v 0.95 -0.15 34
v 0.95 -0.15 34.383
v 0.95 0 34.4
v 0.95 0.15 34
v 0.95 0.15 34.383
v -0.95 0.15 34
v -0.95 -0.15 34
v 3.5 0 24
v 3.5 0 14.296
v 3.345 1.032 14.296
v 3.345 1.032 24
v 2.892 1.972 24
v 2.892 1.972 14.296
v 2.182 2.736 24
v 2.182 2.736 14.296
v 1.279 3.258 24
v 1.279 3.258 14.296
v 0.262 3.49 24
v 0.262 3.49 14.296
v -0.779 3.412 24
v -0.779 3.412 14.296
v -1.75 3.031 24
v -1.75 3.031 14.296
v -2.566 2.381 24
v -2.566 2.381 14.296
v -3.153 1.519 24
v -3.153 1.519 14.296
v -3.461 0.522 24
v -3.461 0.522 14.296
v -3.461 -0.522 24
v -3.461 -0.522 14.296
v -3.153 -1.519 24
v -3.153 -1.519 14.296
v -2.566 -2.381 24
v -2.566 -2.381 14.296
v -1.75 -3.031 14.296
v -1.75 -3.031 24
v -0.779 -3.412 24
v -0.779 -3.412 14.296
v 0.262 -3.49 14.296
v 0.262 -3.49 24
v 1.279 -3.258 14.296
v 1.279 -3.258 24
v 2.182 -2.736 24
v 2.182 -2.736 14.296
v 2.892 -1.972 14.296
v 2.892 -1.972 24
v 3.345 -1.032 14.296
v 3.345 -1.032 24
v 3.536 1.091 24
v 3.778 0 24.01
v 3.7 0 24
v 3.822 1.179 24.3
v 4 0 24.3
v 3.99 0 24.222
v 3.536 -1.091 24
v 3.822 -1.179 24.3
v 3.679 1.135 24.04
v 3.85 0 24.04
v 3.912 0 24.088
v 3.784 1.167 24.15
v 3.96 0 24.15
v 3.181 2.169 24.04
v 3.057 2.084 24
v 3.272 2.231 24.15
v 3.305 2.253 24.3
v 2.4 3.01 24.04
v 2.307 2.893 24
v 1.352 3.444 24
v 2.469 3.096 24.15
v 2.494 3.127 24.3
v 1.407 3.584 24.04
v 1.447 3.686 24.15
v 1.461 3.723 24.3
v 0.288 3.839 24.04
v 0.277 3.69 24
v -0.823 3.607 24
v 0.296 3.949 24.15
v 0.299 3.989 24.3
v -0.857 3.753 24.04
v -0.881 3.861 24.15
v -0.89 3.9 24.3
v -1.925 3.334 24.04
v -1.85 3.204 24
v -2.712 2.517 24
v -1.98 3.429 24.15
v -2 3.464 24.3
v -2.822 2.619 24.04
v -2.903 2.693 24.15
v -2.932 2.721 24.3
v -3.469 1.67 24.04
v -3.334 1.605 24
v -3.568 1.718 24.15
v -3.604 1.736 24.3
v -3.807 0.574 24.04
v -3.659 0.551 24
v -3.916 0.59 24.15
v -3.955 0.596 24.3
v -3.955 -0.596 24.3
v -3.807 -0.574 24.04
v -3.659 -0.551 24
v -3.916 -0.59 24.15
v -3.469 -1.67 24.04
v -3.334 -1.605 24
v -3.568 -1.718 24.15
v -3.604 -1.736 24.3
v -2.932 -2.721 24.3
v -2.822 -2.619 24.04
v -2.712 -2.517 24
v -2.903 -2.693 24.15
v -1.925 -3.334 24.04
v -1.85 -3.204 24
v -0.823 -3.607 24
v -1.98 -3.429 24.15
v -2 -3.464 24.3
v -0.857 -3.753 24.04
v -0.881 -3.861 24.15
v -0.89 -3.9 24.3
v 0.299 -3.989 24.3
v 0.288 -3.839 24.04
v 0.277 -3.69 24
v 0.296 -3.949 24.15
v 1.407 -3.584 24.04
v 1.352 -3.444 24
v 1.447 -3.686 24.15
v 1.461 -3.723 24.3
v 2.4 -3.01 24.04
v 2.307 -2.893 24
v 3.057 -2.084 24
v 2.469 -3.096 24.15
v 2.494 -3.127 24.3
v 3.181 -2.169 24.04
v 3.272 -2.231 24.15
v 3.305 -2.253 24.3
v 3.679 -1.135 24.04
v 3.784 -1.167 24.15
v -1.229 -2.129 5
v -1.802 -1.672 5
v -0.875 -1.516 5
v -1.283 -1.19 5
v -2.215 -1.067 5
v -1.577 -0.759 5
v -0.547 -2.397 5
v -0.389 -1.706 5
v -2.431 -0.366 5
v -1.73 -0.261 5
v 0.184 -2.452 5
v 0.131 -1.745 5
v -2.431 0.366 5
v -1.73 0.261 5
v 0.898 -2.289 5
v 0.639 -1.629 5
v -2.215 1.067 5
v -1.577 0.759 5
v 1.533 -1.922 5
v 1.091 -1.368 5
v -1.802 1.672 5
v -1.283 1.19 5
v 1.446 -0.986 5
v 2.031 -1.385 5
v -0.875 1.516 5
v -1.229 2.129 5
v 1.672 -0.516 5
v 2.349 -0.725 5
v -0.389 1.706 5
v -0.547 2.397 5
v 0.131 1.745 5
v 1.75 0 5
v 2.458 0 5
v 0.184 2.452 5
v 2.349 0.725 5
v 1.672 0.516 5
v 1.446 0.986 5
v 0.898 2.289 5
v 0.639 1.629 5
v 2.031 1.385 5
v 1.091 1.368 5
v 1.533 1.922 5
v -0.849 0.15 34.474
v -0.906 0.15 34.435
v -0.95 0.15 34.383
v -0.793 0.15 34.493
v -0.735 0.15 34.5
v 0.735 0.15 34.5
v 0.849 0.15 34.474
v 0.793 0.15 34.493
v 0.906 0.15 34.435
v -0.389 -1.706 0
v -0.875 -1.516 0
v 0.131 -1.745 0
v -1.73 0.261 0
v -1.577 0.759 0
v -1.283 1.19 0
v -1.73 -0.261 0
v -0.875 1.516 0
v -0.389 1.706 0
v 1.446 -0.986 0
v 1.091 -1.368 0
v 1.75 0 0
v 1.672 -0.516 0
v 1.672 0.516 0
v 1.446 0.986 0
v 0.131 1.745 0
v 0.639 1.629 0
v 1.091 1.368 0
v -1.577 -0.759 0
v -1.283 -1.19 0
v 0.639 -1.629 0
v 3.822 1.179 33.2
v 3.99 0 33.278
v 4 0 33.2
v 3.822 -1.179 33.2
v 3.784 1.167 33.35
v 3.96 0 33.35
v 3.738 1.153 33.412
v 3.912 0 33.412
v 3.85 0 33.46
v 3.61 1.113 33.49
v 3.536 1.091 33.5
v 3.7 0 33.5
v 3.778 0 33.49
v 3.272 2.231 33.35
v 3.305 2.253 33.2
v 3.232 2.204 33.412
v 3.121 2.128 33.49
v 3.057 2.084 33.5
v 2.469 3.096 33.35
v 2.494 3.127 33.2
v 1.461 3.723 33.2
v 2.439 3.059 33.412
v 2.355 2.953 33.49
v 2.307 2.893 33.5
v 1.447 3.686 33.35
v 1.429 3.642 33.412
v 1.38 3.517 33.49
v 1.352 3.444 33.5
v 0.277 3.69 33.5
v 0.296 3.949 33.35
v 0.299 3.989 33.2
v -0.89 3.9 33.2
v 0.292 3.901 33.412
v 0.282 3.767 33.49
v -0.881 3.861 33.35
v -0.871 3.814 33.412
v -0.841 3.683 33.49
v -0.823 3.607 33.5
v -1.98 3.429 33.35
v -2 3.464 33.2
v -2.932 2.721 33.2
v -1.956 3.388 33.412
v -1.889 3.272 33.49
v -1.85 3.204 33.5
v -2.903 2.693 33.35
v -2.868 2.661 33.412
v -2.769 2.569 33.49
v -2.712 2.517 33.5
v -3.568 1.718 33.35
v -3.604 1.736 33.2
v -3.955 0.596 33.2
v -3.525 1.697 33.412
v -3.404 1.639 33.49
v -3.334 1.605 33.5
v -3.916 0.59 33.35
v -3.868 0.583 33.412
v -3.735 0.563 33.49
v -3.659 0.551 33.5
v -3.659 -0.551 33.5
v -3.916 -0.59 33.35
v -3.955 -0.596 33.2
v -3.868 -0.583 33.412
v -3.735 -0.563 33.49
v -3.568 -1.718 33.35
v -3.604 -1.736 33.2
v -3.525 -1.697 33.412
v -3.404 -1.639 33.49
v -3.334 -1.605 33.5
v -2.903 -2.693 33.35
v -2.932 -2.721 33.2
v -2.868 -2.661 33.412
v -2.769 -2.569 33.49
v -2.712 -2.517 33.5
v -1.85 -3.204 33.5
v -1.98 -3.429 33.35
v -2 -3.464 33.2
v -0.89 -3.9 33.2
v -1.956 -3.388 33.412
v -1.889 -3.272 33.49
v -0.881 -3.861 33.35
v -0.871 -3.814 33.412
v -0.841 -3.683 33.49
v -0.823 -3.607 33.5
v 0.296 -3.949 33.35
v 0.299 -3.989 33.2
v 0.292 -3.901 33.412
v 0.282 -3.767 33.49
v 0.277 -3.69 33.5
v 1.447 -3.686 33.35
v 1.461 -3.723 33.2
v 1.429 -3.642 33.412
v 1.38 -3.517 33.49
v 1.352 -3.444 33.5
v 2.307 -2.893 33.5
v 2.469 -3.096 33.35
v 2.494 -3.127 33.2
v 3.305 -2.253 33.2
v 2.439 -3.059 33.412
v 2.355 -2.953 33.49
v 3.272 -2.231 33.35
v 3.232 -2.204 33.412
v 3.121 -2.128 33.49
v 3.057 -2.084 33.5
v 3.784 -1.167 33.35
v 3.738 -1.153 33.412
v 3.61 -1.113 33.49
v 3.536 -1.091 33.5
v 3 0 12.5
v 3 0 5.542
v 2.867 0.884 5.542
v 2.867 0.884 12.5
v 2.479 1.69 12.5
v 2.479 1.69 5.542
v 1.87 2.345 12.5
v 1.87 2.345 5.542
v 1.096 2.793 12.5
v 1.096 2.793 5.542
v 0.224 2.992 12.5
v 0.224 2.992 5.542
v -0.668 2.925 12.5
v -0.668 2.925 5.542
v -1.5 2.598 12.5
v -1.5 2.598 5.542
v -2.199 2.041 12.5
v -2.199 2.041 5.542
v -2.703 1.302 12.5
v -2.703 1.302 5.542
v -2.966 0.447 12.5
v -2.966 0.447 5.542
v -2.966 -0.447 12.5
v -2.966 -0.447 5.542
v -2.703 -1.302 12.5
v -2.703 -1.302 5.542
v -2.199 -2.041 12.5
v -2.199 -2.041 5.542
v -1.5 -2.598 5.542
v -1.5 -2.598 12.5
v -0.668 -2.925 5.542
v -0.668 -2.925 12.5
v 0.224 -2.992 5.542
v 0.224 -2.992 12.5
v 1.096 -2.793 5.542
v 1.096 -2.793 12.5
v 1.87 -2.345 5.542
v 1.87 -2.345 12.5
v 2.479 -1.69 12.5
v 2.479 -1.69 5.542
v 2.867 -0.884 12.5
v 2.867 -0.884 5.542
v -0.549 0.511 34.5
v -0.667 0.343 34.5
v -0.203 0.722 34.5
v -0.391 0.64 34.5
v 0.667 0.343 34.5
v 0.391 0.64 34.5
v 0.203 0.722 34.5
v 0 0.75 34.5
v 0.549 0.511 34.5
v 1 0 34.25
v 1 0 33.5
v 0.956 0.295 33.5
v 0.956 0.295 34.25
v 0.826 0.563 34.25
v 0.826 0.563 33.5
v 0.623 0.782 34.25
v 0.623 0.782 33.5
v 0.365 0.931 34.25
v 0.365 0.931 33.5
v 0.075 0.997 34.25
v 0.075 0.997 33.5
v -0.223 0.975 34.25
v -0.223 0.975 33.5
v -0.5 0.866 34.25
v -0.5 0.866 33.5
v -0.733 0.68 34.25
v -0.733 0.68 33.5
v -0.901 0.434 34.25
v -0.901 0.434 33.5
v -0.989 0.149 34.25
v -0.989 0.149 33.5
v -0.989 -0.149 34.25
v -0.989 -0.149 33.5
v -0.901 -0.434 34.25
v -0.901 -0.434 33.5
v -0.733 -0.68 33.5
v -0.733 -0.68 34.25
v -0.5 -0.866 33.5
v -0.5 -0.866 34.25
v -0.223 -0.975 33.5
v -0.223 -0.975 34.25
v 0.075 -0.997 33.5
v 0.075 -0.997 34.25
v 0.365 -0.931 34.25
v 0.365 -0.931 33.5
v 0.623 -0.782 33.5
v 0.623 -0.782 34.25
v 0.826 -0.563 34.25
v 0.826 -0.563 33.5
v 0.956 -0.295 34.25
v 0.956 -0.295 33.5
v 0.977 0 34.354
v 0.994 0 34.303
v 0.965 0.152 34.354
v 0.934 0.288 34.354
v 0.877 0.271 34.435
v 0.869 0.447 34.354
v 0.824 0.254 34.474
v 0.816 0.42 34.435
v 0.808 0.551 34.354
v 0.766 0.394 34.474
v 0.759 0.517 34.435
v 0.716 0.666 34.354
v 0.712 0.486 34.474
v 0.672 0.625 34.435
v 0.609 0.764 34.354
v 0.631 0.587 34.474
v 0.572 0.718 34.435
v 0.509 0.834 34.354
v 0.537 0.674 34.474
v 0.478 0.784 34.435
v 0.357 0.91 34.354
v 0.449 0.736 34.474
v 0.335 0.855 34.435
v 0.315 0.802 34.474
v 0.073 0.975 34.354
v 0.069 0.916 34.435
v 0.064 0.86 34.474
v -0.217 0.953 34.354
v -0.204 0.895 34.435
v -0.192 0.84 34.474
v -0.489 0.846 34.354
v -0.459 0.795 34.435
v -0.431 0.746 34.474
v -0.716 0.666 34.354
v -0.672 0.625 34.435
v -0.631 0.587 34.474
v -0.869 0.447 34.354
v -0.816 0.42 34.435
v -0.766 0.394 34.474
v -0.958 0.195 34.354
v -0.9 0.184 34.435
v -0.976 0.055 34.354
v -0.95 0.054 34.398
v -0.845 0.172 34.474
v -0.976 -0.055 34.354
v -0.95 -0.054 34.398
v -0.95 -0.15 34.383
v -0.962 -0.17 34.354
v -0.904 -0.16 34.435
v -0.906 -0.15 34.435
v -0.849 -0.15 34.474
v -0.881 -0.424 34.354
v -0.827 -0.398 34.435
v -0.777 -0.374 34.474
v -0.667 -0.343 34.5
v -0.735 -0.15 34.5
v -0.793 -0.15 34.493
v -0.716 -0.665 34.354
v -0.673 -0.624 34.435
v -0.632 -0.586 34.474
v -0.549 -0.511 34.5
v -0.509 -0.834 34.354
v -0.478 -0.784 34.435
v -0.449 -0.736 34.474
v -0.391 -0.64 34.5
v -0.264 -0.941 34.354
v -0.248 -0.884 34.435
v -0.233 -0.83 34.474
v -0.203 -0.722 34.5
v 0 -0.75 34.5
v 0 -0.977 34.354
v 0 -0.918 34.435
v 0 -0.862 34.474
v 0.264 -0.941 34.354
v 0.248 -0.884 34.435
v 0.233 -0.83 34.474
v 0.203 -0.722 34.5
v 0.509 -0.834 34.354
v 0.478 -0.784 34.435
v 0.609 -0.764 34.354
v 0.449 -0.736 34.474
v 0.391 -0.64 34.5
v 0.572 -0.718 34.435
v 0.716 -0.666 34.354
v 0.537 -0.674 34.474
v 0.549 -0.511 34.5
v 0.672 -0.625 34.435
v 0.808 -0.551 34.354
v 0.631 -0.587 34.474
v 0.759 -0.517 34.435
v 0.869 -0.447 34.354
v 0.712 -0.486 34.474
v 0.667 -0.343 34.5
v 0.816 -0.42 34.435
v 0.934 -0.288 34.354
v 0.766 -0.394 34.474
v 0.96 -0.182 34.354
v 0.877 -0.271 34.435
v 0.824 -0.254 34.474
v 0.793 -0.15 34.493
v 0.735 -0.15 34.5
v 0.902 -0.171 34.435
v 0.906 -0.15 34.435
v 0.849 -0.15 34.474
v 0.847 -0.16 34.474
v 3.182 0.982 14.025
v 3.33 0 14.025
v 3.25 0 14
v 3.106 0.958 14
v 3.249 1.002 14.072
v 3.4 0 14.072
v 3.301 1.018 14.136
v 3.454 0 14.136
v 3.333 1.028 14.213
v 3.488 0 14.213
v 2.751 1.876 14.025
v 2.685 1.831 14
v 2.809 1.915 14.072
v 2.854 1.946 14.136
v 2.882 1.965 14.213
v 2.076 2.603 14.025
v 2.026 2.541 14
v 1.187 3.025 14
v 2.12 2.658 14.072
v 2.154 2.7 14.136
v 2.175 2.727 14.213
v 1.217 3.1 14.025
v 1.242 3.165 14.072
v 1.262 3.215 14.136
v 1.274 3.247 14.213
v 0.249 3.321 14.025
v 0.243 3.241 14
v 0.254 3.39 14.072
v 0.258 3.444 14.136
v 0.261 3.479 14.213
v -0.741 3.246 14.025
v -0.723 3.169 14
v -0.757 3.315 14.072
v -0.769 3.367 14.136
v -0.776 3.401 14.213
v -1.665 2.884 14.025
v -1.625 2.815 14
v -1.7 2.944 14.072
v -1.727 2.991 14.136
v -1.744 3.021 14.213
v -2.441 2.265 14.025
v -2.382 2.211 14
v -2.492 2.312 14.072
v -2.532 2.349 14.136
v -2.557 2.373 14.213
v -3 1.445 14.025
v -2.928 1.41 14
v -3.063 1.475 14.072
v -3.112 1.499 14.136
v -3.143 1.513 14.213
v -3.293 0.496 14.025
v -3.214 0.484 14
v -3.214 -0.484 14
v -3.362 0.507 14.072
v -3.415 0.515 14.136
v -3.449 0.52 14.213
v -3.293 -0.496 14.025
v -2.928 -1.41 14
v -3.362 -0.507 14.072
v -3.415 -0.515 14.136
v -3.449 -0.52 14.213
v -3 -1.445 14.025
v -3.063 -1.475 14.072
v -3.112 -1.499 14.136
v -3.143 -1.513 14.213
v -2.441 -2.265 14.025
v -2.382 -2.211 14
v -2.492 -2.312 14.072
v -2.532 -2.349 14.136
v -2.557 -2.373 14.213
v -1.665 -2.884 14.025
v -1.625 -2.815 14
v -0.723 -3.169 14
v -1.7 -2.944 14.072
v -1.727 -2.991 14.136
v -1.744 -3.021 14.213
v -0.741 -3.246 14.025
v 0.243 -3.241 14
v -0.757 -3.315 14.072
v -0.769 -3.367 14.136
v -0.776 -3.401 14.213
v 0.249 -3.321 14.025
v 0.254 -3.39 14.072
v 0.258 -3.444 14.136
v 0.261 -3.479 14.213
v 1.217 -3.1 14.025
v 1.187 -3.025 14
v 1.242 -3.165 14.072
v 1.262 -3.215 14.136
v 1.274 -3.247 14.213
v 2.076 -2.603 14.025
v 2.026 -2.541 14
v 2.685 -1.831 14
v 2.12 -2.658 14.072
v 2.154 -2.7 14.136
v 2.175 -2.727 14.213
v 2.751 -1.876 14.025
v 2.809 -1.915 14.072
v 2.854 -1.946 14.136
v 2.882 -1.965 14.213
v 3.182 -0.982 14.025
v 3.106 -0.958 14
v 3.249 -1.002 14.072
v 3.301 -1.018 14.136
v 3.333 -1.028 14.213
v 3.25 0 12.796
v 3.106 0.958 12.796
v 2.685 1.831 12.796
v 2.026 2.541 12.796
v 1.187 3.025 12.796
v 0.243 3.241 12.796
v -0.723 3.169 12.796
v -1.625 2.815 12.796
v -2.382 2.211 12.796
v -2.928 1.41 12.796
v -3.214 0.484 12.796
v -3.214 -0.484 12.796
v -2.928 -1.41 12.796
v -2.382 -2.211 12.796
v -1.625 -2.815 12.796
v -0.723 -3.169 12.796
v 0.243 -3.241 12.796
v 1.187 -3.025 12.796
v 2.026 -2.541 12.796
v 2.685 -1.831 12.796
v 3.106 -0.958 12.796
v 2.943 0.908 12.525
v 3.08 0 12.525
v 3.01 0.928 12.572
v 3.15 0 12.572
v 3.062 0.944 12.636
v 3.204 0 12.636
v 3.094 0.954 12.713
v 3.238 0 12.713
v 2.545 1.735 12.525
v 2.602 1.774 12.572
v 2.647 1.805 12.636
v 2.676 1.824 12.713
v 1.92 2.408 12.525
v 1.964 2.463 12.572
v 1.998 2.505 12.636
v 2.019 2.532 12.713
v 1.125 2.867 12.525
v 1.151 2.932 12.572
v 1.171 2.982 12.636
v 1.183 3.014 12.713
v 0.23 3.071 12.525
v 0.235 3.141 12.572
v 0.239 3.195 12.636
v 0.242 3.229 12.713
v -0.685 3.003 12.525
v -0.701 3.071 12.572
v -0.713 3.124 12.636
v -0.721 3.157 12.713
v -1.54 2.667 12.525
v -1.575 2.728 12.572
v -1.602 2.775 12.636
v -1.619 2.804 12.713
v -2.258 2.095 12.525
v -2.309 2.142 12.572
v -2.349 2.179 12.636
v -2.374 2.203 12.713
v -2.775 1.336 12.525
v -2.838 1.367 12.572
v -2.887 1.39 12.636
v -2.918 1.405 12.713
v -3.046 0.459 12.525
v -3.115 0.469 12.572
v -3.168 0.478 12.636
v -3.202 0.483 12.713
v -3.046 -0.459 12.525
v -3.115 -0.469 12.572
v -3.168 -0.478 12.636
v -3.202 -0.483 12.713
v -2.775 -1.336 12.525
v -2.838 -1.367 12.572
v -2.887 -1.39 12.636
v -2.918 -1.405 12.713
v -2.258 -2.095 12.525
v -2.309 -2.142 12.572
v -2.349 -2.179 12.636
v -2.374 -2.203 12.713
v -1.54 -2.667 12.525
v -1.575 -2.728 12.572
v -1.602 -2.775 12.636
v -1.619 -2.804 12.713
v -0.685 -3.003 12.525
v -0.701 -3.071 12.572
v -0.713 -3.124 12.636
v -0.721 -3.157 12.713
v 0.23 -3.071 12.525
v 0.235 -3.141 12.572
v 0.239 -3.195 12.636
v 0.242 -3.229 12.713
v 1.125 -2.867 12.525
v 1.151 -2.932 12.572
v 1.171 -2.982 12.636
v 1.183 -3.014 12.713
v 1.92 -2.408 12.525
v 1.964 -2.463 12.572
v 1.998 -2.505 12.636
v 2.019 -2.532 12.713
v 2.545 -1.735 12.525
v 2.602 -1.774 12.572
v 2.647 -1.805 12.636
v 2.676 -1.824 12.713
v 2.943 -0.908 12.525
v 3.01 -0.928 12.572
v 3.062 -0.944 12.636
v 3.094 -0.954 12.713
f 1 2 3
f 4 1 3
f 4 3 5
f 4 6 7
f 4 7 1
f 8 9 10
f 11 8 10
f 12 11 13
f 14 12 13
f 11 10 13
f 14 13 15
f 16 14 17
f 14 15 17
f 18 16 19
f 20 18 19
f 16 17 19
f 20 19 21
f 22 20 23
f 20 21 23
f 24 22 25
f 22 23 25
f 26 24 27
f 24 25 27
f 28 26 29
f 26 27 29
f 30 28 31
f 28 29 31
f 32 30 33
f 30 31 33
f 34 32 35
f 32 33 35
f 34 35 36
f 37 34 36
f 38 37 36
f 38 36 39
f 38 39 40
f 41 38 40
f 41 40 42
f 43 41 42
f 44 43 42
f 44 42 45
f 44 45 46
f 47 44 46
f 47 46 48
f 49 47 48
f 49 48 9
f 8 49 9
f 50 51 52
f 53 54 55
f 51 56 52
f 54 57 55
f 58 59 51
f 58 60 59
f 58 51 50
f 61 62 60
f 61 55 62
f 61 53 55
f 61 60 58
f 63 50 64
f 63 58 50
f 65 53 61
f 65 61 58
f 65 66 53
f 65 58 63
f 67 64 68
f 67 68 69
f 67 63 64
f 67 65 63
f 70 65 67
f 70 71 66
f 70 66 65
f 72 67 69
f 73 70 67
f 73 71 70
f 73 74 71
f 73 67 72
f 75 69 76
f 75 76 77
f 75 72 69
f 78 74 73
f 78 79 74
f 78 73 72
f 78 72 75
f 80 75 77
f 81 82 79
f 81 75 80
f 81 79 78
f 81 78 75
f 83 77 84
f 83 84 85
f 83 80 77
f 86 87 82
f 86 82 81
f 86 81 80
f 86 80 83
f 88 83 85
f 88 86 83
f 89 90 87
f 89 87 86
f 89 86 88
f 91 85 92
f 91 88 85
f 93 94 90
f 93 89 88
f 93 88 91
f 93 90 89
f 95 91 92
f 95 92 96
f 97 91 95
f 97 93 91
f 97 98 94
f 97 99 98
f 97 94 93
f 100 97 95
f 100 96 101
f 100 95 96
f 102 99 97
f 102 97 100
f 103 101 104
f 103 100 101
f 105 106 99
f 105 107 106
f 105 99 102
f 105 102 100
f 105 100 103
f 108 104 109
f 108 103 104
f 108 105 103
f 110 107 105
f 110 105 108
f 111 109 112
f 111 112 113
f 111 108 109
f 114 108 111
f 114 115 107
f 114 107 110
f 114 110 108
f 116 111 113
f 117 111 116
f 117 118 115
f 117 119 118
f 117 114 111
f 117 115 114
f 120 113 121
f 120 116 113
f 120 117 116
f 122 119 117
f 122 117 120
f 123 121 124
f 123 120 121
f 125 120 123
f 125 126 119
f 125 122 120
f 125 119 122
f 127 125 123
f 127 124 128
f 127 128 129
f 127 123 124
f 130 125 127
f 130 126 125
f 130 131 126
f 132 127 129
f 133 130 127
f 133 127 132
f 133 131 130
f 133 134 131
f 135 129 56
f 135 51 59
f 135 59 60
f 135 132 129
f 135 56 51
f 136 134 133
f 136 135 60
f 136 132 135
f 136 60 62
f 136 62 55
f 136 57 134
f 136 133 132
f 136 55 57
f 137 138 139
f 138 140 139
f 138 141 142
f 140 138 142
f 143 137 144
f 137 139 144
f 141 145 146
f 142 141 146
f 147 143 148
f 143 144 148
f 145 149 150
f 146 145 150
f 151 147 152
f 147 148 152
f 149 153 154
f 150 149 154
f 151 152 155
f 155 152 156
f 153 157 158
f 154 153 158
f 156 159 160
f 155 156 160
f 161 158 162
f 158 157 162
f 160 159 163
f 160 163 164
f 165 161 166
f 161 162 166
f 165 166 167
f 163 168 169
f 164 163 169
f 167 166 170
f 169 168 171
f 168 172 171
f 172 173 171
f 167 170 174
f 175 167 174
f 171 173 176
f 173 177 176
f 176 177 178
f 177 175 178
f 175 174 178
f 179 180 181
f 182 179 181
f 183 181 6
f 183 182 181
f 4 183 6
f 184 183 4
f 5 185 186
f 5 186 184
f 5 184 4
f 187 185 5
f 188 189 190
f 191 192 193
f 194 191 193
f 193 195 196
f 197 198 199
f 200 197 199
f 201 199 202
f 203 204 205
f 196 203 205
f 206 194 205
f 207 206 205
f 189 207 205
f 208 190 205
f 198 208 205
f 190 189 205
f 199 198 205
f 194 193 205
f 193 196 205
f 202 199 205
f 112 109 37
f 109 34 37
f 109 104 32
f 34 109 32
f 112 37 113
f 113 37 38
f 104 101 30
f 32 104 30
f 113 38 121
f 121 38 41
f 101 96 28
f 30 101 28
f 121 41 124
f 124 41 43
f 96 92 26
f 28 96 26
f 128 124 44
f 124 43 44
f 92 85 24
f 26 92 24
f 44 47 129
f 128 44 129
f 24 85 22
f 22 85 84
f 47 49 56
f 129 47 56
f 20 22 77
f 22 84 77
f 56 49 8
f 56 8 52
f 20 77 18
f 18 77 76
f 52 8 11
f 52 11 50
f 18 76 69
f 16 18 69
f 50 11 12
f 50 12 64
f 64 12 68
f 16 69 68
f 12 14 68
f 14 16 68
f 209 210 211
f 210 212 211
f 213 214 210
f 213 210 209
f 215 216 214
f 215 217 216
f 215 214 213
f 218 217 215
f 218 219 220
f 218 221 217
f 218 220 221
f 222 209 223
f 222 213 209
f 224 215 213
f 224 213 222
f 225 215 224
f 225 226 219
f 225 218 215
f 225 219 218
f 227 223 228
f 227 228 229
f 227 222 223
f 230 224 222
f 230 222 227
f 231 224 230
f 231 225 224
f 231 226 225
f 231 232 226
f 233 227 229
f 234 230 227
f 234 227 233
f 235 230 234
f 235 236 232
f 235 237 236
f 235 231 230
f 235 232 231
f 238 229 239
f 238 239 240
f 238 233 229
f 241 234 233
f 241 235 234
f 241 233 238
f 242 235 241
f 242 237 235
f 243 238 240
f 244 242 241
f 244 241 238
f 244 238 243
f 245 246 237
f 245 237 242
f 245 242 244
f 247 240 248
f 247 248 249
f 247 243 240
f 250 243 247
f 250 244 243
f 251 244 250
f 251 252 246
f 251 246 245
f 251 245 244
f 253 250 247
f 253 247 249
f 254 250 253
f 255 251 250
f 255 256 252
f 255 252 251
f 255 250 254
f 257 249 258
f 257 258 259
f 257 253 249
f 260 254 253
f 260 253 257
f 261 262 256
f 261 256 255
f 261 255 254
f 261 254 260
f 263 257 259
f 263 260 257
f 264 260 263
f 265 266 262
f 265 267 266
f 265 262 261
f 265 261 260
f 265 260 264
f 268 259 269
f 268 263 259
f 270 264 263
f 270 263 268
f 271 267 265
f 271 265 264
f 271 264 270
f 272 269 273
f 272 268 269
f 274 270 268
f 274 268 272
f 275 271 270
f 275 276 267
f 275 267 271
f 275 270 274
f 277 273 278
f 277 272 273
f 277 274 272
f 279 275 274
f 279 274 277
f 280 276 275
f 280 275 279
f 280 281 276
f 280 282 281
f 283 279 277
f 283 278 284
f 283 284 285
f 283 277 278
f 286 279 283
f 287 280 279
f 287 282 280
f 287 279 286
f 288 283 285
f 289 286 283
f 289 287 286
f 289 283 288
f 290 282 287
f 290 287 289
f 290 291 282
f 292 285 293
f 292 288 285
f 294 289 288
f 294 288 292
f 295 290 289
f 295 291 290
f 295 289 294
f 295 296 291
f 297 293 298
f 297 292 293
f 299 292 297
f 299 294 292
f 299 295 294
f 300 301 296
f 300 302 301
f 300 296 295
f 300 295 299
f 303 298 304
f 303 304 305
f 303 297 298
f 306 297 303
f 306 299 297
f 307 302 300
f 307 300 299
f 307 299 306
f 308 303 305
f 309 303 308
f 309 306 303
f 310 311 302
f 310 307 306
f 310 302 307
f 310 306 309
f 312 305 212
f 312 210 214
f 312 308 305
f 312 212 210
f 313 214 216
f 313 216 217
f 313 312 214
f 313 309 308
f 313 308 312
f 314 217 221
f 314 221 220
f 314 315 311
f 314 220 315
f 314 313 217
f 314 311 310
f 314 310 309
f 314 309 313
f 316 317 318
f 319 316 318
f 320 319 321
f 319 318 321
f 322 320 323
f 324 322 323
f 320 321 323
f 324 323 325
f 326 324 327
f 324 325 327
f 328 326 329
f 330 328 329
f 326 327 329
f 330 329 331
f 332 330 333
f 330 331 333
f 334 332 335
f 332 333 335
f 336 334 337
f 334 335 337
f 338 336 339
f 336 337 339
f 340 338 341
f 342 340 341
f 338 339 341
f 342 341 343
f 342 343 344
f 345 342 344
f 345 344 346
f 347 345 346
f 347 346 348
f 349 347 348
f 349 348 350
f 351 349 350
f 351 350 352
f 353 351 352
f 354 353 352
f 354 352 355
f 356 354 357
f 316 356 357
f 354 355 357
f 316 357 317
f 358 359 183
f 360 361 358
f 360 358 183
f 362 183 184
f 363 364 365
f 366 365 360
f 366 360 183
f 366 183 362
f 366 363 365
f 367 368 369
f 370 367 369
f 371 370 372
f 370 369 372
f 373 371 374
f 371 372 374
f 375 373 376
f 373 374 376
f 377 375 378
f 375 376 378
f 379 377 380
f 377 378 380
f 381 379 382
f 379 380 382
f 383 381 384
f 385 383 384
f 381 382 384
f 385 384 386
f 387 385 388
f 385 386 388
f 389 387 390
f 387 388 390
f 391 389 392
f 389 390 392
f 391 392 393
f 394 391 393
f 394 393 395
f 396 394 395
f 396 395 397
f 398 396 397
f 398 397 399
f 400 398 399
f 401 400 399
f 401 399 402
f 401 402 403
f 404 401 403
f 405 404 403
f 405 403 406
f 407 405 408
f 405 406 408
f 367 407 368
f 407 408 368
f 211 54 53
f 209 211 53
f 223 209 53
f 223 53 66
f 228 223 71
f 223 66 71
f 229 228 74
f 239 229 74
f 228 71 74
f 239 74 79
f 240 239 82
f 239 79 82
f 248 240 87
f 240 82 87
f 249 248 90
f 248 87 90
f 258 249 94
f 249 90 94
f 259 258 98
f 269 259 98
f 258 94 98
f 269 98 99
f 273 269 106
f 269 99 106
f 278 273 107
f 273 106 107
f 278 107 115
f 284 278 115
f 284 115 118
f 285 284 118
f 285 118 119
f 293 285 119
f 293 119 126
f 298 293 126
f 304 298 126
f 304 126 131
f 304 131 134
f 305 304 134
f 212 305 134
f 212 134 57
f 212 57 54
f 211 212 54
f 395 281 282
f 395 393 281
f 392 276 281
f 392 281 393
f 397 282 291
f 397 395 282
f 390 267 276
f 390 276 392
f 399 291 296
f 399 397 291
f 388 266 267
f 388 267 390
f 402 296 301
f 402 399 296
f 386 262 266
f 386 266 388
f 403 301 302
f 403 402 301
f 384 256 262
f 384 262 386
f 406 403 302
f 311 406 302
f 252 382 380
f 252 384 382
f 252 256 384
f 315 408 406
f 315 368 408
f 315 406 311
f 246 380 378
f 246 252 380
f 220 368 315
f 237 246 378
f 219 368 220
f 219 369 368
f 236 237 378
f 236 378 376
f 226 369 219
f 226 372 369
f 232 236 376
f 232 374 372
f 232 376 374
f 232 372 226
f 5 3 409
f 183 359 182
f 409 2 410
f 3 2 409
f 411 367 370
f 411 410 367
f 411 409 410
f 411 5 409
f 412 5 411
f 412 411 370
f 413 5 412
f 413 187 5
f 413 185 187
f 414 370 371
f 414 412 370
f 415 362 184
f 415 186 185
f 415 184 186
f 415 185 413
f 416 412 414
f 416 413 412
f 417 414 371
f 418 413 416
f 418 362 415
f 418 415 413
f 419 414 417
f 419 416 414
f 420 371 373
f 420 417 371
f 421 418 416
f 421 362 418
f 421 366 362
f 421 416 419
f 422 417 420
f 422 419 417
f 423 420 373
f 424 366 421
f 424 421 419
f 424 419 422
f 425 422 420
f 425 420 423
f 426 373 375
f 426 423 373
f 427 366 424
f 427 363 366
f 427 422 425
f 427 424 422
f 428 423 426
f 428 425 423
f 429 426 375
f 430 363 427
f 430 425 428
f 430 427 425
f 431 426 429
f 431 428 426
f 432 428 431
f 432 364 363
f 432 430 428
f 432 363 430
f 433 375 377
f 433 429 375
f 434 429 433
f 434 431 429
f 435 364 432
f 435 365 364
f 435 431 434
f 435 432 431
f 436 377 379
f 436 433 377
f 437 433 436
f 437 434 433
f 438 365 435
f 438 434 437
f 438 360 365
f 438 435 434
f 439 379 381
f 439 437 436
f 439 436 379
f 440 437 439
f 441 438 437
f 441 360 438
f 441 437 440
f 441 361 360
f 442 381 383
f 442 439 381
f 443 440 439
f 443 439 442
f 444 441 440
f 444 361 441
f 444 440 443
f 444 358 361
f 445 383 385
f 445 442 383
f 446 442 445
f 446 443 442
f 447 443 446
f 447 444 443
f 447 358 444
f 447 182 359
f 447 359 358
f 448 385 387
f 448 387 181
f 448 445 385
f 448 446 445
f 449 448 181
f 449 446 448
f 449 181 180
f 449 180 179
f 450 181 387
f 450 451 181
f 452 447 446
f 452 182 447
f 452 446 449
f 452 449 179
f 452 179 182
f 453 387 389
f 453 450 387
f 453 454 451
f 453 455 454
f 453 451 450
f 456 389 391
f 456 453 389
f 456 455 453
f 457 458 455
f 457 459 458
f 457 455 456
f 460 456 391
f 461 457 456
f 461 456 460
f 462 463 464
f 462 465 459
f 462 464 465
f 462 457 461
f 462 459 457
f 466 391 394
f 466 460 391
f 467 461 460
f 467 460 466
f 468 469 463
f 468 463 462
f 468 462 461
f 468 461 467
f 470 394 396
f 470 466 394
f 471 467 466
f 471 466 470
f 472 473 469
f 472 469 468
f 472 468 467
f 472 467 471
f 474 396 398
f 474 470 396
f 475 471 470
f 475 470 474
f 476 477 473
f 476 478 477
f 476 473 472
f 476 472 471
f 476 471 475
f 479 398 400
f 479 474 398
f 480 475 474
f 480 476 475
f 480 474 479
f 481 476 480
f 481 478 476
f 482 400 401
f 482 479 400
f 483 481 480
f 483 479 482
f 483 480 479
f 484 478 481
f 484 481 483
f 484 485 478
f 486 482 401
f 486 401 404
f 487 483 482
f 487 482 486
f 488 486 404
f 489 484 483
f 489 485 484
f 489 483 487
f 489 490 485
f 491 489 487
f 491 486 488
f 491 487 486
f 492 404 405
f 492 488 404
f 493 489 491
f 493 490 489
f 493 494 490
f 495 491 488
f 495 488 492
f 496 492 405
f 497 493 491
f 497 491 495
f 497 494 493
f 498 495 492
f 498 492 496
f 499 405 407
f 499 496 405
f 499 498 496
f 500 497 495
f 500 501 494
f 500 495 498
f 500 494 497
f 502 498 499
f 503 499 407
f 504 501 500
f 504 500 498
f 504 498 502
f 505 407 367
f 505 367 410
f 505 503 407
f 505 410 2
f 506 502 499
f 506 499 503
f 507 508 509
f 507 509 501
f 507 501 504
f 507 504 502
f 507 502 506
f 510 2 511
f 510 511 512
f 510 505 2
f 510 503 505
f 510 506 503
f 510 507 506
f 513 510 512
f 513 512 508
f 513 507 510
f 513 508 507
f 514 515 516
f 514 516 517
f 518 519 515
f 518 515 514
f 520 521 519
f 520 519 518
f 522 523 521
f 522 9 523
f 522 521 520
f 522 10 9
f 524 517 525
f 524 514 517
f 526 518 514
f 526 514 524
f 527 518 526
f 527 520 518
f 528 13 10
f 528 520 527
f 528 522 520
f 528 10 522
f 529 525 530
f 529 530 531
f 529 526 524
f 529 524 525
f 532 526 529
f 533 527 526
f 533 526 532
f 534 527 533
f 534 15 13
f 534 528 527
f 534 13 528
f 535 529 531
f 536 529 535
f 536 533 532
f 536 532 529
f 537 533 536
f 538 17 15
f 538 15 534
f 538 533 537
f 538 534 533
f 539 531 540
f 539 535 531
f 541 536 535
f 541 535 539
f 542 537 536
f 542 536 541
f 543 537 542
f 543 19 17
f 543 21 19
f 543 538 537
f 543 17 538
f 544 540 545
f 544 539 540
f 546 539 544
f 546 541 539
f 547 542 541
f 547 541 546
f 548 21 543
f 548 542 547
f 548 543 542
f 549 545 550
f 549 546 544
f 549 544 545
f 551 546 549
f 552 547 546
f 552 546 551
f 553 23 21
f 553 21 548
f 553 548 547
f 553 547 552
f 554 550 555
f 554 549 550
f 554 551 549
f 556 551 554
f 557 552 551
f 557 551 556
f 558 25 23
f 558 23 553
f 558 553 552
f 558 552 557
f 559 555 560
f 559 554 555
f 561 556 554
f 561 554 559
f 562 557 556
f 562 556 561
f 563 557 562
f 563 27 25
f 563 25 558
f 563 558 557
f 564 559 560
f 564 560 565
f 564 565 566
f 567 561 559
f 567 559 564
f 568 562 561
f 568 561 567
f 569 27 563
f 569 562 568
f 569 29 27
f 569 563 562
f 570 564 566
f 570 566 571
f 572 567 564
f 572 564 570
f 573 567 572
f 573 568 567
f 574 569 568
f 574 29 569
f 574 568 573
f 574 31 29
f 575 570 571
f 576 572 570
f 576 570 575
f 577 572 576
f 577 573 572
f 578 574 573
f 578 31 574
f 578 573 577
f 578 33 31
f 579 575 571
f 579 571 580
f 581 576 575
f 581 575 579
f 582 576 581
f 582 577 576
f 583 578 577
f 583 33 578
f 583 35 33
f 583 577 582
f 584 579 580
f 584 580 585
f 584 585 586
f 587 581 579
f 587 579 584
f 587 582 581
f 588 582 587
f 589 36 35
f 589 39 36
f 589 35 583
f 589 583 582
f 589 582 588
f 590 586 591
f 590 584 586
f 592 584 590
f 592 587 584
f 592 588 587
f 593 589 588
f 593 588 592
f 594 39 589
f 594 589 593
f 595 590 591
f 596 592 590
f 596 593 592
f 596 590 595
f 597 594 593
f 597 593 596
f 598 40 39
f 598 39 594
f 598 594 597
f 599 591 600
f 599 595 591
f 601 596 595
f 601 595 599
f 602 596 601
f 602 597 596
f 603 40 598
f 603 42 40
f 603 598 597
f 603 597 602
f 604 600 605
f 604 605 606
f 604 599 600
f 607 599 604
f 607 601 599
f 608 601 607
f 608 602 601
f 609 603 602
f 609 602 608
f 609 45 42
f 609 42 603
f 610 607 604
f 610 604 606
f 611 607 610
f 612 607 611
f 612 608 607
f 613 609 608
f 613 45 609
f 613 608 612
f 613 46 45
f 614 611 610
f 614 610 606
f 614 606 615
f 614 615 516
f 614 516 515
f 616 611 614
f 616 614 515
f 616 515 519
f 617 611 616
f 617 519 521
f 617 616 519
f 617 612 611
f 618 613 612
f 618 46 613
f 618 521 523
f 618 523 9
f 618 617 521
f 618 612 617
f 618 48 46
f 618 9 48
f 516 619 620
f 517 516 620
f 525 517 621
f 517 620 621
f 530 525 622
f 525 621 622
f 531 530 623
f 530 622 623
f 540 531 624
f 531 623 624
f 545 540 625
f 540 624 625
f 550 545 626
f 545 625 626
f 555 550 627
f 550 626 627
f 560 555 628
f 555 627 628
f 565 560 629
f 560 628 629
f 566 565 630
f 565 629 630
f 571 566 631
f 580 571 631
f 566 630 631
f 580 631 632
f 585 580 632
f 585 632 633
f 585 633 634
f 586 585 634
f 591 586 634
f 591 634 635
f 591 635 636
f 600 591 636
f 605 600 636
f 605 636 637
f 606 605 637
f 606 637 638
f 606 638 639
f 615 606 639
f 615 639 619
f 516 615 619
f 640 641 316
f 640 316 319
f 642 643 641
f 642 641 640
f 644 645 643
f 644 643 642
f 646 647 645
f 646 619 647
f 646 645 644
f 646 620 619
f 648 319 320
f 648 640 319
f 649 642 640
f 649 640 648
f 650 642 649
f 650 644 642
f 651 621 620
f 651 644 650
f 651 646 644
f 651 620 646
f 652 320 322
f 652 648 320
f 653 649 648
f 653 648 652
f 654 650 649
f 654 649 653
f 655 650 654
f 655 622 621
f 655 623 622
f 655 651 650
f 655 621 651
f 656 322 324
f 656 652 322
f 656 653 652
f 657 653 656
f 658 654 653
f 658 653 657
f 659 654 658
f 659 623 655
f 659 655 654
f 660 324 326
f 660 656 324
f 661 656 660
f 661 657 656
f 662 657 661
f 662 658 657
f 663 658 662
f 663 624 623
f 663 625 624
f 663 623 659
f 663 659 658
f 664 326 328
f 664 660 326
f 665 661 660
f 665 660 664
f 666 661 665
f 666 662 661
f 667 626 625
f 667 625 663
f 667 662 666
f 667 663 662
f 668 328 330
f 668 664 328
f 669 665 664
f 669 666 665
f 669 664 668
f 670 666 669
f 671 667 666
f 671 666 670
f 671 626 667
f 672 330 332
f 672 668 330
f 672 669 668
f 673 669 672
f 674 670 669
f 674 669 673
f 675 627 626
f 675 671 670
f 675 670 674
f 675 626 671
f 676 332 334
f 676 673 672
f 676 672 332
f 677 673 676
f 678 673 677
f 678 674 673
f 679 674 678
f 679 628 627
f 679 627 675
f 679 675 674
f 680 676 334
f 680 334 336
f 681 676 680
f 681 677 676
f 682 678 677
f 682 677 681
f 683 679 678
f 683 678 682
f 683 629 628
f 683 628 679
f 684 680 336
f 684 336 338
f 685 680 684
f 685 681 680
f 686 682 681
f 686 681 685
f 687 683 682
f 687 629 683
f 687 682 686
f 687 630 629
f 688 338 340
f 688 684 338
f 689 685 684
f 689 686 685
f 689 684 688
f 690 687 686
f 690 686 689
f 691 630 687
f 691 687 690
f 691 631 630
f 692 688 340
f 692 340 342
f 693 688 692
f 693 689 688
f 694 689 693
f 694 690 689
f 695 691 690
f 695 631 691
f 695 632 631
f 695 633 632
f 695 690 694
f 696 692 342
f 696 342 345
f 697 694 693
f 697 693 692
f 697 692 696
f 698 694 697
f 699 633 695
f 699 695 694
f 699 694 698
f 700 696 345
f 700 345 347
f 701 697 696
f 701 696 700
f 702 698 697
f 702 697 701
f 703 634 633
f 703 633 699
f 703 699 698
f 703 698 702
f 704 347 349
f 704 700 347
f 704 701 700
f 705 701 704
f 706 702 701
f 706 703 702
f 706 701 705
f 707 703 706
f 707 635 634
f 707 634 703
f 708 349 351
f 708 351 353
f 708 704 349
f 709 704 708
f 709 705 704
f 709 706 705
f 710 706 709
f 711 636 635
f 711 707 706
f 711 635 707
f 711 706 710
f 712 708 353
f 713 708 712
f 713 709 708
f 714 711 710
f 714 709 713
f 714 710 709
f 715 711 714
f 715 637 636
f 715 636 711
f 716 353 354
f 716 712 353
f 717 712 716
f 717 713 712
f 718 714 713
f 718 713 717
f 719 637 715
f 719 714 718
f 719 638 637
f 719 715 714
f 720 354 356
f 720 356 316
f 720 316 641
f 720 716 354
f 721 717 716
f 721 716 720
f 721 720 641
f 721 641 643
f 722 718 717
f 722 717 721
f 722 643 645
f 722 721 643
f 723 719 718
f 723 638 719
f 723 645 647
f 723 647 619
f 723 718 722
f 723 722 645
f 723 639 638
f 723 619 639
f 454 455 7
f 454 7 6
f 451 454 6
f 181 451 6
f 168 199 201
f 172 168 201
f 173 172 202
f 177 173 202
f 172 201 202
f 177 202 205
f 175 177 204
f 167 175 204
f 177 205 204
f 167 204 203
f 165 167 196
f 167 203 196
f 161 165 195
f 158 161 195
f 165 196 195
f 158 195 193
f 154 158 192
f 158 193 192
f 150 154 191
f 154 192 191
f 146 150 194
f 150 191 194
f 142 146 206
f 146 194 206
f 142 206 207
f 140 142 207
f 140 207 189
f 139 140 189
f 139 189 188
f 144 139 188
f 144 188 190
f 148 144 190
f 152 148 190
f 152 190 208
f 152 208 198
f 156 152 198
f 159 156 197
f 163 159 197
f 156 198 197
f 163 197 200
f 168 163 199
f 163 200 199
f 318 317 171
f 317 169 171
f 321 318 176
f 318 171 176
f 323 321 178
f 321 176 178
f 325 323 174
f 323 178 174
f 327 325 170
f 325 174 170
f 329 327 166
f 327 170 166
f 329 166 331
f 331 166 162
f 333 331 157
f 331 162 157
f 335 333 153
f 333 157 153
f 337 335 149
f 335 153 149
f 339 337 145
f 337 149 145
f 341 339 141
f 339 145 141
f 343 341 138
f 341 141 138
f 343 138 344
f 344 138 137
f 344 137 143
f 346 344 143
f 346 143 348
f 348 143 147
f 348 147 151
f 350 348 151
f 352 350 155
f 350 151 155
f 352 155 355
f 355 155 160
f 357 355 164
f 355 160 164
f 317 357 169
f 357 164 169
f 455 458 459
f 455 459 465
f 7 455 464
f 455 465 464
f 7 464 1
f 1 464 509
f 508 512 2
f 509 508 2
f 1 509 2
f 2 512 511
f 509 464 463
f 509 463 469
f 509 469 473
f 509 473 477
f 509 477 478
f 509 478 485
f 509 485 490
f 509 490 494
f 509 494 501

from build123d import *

# Parameters (mm, degrees)
SKETCH_1_R          = 1.75
EXTRUDE_1_DEPTH     = 5
SKETCH_2_R          = 3.5
EXTRUDE_2_DEPTH     = 4
SKETCH_3_R          = 3.5
EXTRUDE_3_DEPTH     = 1
CUT_EXTRUDE_START   = -1
SKETCH_25_R         = 3.5
CUT_EXTRUDE_1_DEPTH = 1
SKETCH_26_R         = 3
EXTRUDE_8_DEPTH     = 3.5
SKETCH_27_R         = 3.25
EXTRUDE_9_DEPTH     = 1.5
SKETCH_28_R         = 3.5
EXTRUDE_10_DEPTH    = 10
SKETCH_29_R         = 4
EXTRUDE_11_DEPTH    = 9.5
SKETCH_30_R         = 1
EXTRUDE_12_DEPTH    = 1
FILLET_1_R          = 0.25
FILLET_2_R          = 0.3
SKETCH_31_W         = 1.9
SKETCH_31_H         = 0.3
CUT_EXTRUDE_2_DEPTH = 0.5


# Read off the part's stored shape, not the designer's step: M6 机械螺纹 螺柱5
with BuildPart() as part:
    # 草图1 → 凸台-拉伸1 (new body)
    with BuildSketch(Plane.XY):
        Circle(SKETCH_1_R)
    extrude(amount=EXTRUDE_1_DEPTH)

    # 草图2 → 凸台-拉伸2 (add)
    with BuildSketch(Plane.XY.offset(5)):
        Circle(SKETCH_2_R)
    extrude(amount=EXTRUDE_2_DEPTH)

    # 草图3 → 凸台-拉伸3 (add)
    with BuildSketch(Plane.XY.offset(9)):
        Circle(SKETCH_3_R)
    extrude(amount=EXTRUDE_3_DEPTH)

    # M6 机械螺纹 螺柱5 outline → M6 机械螺纹 螺柱5 (revolve, cut)
    with BuildSketch(Plane.XZ):
        Polygon((2.4585, 5), (3.5, 5), (3.5, 9), (3, 9), (3, 5.5415), align=None)
    revolve(axis=Axis((0, 0, 0), (0, 0, 1)), mode=Mode.SUBTRACT)

    # 草图25 → 切除-拉伸1 (cut)
    with BuildSketch(Plane.XY.offset(10).offset(CUT_EXTRUDE_START)):
        Circle(SKETCH_25_R)
    extrude(amount=CUT_EXTRUDE_1_DEPTH, mode=Mode.SUBTRACT)

    # 草图26 → 凸台-拉伸8 (add)
    with BuildSketch(Plane.XY.offset(9)):
        Circle(SKETCH_26_R)
    extrude(amount=EXTRUDE_8_DEPTH)

    # 草图27 → 凸台-拉伸9 (add)
    with BuildSketch(Plane.XY.offset(12.5)):
        Circle(SKETCH_27_R)
    extrude(amount=EXTRUDE_9_DEPTH)

    # 草图28 → 凸台-拉伸10 (add)
    with BuildSketch(Plane.XY.offset(14)):
        Circle(SKETCH_28_R)
    extrude(amount=EXTRUDE_10_DEPTH)

    # 草图29 → 凸台-拉伸11 (add)
    with BuildSketch(Plane.XY.offset(24)):
        Circle(SKETCH_29_R)
    extrude(amount=EXTRUDE_11_DEPTH)

    # 草图30 → 凸台-拉伸12 (add)
    with BuildSketch(Plane.XY.offset(33.5)):
        Circle(SKETCH_30_R)
    extrude(amount=EXTRUDE_12_DEPTH)

    # 圆角1
    fillet_1_edges = [part.edges().sort_by_distance(p)[0] for p in [
        (-1, 0, 34.5),
    ]]
    fillet(fillet_1_edges, radius=FILLET_1_R)

    # 圆角2
    # the kernel refuses this fillet: 0.3 mm, written as the material it takes off along each edge
    with BuildSketch(Plane(origin=(0, 0, 12.5), x_dir=(1, 0, 0), z_dir=(0, -1, 0))) as fillet_2_piece_1:
        with BuildLine():
            CenterArc((2.95, 0.295803989), FILLET_2_R, 279.594068227, 80.405931773)
            Line((3, 0), (3.001, -0.00591608))
            ThreePointArc((3.001, -0.00591608), (3.125, -0.006), (3.25, -0.006))
            Line((3.25, -0.006), (3.256, 0))
            Line((3.256, 0), (3.256, 0.295803989))
            Line((3.256, 0.295803989), (3.25, 0.295803989))
        make_face()
    revolve(axis=Axis((0, 0, 12.5), (0, 0, 1)), mode=Mode.SUBTRACT)
    with BuildSketch(Plane(origin=(0, 0, 14), x_dir=(1, 0, 0), z_dir=(0, -1, 0))) as fillet_2_piece_2:
        with BuildLine():
            CenterArc((3.2, 0.295803989), FILLET_2_R, 279.594068227, 80.405931773)
            Line((3.25, 0), (3.251, -0.00591608))
            ThreePointArc((3.251, -0.00591608), (3.375, -0.006), (3.5, -0.006))
            Line((3.5, -0.006), (3.506, 0))
            Line((3.506, 0), (3.506, 0.295803989))
            Line((3.506, 0.295803989), (3.5, 0.295803989))
        make_face()
    revolve(axis=Axis((0, 0, 14), (0, 0, 1)), mode=Mode.SUBTRACT)
    with BuildSketch(Plane(origin=(0, 0, 24), x_dir=(1, 0, 0), z_dir=(0, -1, 0))) as fillet_2_piece_3:
        with BuildLine():
            CenterArc((4 - FILLET_2_R, FILLET_2_R), FILLET_2_R, 270, 90)
            Line((4 - FILLET_2_R, 0), (4 - FILLET_2_R, -FILLET_2_R * 0.02))
            Line((4 - FILLET_2_R, -FILLET_2_R * 0.02), (4 + FILLET_2_R * 0.02, -FILLET_2_R * 0.02))
            Line((4 + FILLET_2_R * 0.02, -FILLET_2_R * 0.02), (4 + FILLET_2_R * 0.02, FILLET_2_R))
            Line((4 + FILLET_2_R * 0.02, FILLET_2_R), (4, FILLET_2_R))
        make_face()
    revolve(axis=Axis((0, 0, 24), (0, 0, 1)), mode=Mode.SUBTRACT)
    with BuildSketch(Plane(origin=(0, 0, 33.5), x_dir=(1, 0, 0), z_dir=(0, -1, 0))) as fillet_2_piece_4:
        with BuildLine():
            CenterArc((4 - FILLET_2_R, -FILLET_2_R), FILLET_2_R, 0, 90)
            Line((4, -FILLET_2_R), (4 + FILLET_2_R * 0.02, -FILLET_2_R))
            Line((4 + FILLET_2_R * 0.02, -FILLET_2_R), (4 + FILLET_2_R * 0.02, FILLET_2_R * 0.02))
            Line((4 + FILLET_2_R * 0.02, FILLET_2_R * 0.02), (4 - FILLET_2_R, FILLET_2_R * 0.02))
            Line((4 - FILLET_2_R, FILLET_2_R * 0.02), (4 - FILLET_2_R, 0))
        make_face()
    revolve(axis=Axis((0, 0, 33.5), (0, 0, 1)), mode=Mode.SUBTRACT)

    # 草图31 → 切除-拉伸2 (cut)
    with BuildSketch(Plane.XY.offset(34.5)):
        Rectangle(SKETCH_31_W, SKETCH_31_H)
    extrude(amount=-CUT_EXTRUDE_2_DEPTH, mode=Mode.SUBTRACT)


solid = part.part
